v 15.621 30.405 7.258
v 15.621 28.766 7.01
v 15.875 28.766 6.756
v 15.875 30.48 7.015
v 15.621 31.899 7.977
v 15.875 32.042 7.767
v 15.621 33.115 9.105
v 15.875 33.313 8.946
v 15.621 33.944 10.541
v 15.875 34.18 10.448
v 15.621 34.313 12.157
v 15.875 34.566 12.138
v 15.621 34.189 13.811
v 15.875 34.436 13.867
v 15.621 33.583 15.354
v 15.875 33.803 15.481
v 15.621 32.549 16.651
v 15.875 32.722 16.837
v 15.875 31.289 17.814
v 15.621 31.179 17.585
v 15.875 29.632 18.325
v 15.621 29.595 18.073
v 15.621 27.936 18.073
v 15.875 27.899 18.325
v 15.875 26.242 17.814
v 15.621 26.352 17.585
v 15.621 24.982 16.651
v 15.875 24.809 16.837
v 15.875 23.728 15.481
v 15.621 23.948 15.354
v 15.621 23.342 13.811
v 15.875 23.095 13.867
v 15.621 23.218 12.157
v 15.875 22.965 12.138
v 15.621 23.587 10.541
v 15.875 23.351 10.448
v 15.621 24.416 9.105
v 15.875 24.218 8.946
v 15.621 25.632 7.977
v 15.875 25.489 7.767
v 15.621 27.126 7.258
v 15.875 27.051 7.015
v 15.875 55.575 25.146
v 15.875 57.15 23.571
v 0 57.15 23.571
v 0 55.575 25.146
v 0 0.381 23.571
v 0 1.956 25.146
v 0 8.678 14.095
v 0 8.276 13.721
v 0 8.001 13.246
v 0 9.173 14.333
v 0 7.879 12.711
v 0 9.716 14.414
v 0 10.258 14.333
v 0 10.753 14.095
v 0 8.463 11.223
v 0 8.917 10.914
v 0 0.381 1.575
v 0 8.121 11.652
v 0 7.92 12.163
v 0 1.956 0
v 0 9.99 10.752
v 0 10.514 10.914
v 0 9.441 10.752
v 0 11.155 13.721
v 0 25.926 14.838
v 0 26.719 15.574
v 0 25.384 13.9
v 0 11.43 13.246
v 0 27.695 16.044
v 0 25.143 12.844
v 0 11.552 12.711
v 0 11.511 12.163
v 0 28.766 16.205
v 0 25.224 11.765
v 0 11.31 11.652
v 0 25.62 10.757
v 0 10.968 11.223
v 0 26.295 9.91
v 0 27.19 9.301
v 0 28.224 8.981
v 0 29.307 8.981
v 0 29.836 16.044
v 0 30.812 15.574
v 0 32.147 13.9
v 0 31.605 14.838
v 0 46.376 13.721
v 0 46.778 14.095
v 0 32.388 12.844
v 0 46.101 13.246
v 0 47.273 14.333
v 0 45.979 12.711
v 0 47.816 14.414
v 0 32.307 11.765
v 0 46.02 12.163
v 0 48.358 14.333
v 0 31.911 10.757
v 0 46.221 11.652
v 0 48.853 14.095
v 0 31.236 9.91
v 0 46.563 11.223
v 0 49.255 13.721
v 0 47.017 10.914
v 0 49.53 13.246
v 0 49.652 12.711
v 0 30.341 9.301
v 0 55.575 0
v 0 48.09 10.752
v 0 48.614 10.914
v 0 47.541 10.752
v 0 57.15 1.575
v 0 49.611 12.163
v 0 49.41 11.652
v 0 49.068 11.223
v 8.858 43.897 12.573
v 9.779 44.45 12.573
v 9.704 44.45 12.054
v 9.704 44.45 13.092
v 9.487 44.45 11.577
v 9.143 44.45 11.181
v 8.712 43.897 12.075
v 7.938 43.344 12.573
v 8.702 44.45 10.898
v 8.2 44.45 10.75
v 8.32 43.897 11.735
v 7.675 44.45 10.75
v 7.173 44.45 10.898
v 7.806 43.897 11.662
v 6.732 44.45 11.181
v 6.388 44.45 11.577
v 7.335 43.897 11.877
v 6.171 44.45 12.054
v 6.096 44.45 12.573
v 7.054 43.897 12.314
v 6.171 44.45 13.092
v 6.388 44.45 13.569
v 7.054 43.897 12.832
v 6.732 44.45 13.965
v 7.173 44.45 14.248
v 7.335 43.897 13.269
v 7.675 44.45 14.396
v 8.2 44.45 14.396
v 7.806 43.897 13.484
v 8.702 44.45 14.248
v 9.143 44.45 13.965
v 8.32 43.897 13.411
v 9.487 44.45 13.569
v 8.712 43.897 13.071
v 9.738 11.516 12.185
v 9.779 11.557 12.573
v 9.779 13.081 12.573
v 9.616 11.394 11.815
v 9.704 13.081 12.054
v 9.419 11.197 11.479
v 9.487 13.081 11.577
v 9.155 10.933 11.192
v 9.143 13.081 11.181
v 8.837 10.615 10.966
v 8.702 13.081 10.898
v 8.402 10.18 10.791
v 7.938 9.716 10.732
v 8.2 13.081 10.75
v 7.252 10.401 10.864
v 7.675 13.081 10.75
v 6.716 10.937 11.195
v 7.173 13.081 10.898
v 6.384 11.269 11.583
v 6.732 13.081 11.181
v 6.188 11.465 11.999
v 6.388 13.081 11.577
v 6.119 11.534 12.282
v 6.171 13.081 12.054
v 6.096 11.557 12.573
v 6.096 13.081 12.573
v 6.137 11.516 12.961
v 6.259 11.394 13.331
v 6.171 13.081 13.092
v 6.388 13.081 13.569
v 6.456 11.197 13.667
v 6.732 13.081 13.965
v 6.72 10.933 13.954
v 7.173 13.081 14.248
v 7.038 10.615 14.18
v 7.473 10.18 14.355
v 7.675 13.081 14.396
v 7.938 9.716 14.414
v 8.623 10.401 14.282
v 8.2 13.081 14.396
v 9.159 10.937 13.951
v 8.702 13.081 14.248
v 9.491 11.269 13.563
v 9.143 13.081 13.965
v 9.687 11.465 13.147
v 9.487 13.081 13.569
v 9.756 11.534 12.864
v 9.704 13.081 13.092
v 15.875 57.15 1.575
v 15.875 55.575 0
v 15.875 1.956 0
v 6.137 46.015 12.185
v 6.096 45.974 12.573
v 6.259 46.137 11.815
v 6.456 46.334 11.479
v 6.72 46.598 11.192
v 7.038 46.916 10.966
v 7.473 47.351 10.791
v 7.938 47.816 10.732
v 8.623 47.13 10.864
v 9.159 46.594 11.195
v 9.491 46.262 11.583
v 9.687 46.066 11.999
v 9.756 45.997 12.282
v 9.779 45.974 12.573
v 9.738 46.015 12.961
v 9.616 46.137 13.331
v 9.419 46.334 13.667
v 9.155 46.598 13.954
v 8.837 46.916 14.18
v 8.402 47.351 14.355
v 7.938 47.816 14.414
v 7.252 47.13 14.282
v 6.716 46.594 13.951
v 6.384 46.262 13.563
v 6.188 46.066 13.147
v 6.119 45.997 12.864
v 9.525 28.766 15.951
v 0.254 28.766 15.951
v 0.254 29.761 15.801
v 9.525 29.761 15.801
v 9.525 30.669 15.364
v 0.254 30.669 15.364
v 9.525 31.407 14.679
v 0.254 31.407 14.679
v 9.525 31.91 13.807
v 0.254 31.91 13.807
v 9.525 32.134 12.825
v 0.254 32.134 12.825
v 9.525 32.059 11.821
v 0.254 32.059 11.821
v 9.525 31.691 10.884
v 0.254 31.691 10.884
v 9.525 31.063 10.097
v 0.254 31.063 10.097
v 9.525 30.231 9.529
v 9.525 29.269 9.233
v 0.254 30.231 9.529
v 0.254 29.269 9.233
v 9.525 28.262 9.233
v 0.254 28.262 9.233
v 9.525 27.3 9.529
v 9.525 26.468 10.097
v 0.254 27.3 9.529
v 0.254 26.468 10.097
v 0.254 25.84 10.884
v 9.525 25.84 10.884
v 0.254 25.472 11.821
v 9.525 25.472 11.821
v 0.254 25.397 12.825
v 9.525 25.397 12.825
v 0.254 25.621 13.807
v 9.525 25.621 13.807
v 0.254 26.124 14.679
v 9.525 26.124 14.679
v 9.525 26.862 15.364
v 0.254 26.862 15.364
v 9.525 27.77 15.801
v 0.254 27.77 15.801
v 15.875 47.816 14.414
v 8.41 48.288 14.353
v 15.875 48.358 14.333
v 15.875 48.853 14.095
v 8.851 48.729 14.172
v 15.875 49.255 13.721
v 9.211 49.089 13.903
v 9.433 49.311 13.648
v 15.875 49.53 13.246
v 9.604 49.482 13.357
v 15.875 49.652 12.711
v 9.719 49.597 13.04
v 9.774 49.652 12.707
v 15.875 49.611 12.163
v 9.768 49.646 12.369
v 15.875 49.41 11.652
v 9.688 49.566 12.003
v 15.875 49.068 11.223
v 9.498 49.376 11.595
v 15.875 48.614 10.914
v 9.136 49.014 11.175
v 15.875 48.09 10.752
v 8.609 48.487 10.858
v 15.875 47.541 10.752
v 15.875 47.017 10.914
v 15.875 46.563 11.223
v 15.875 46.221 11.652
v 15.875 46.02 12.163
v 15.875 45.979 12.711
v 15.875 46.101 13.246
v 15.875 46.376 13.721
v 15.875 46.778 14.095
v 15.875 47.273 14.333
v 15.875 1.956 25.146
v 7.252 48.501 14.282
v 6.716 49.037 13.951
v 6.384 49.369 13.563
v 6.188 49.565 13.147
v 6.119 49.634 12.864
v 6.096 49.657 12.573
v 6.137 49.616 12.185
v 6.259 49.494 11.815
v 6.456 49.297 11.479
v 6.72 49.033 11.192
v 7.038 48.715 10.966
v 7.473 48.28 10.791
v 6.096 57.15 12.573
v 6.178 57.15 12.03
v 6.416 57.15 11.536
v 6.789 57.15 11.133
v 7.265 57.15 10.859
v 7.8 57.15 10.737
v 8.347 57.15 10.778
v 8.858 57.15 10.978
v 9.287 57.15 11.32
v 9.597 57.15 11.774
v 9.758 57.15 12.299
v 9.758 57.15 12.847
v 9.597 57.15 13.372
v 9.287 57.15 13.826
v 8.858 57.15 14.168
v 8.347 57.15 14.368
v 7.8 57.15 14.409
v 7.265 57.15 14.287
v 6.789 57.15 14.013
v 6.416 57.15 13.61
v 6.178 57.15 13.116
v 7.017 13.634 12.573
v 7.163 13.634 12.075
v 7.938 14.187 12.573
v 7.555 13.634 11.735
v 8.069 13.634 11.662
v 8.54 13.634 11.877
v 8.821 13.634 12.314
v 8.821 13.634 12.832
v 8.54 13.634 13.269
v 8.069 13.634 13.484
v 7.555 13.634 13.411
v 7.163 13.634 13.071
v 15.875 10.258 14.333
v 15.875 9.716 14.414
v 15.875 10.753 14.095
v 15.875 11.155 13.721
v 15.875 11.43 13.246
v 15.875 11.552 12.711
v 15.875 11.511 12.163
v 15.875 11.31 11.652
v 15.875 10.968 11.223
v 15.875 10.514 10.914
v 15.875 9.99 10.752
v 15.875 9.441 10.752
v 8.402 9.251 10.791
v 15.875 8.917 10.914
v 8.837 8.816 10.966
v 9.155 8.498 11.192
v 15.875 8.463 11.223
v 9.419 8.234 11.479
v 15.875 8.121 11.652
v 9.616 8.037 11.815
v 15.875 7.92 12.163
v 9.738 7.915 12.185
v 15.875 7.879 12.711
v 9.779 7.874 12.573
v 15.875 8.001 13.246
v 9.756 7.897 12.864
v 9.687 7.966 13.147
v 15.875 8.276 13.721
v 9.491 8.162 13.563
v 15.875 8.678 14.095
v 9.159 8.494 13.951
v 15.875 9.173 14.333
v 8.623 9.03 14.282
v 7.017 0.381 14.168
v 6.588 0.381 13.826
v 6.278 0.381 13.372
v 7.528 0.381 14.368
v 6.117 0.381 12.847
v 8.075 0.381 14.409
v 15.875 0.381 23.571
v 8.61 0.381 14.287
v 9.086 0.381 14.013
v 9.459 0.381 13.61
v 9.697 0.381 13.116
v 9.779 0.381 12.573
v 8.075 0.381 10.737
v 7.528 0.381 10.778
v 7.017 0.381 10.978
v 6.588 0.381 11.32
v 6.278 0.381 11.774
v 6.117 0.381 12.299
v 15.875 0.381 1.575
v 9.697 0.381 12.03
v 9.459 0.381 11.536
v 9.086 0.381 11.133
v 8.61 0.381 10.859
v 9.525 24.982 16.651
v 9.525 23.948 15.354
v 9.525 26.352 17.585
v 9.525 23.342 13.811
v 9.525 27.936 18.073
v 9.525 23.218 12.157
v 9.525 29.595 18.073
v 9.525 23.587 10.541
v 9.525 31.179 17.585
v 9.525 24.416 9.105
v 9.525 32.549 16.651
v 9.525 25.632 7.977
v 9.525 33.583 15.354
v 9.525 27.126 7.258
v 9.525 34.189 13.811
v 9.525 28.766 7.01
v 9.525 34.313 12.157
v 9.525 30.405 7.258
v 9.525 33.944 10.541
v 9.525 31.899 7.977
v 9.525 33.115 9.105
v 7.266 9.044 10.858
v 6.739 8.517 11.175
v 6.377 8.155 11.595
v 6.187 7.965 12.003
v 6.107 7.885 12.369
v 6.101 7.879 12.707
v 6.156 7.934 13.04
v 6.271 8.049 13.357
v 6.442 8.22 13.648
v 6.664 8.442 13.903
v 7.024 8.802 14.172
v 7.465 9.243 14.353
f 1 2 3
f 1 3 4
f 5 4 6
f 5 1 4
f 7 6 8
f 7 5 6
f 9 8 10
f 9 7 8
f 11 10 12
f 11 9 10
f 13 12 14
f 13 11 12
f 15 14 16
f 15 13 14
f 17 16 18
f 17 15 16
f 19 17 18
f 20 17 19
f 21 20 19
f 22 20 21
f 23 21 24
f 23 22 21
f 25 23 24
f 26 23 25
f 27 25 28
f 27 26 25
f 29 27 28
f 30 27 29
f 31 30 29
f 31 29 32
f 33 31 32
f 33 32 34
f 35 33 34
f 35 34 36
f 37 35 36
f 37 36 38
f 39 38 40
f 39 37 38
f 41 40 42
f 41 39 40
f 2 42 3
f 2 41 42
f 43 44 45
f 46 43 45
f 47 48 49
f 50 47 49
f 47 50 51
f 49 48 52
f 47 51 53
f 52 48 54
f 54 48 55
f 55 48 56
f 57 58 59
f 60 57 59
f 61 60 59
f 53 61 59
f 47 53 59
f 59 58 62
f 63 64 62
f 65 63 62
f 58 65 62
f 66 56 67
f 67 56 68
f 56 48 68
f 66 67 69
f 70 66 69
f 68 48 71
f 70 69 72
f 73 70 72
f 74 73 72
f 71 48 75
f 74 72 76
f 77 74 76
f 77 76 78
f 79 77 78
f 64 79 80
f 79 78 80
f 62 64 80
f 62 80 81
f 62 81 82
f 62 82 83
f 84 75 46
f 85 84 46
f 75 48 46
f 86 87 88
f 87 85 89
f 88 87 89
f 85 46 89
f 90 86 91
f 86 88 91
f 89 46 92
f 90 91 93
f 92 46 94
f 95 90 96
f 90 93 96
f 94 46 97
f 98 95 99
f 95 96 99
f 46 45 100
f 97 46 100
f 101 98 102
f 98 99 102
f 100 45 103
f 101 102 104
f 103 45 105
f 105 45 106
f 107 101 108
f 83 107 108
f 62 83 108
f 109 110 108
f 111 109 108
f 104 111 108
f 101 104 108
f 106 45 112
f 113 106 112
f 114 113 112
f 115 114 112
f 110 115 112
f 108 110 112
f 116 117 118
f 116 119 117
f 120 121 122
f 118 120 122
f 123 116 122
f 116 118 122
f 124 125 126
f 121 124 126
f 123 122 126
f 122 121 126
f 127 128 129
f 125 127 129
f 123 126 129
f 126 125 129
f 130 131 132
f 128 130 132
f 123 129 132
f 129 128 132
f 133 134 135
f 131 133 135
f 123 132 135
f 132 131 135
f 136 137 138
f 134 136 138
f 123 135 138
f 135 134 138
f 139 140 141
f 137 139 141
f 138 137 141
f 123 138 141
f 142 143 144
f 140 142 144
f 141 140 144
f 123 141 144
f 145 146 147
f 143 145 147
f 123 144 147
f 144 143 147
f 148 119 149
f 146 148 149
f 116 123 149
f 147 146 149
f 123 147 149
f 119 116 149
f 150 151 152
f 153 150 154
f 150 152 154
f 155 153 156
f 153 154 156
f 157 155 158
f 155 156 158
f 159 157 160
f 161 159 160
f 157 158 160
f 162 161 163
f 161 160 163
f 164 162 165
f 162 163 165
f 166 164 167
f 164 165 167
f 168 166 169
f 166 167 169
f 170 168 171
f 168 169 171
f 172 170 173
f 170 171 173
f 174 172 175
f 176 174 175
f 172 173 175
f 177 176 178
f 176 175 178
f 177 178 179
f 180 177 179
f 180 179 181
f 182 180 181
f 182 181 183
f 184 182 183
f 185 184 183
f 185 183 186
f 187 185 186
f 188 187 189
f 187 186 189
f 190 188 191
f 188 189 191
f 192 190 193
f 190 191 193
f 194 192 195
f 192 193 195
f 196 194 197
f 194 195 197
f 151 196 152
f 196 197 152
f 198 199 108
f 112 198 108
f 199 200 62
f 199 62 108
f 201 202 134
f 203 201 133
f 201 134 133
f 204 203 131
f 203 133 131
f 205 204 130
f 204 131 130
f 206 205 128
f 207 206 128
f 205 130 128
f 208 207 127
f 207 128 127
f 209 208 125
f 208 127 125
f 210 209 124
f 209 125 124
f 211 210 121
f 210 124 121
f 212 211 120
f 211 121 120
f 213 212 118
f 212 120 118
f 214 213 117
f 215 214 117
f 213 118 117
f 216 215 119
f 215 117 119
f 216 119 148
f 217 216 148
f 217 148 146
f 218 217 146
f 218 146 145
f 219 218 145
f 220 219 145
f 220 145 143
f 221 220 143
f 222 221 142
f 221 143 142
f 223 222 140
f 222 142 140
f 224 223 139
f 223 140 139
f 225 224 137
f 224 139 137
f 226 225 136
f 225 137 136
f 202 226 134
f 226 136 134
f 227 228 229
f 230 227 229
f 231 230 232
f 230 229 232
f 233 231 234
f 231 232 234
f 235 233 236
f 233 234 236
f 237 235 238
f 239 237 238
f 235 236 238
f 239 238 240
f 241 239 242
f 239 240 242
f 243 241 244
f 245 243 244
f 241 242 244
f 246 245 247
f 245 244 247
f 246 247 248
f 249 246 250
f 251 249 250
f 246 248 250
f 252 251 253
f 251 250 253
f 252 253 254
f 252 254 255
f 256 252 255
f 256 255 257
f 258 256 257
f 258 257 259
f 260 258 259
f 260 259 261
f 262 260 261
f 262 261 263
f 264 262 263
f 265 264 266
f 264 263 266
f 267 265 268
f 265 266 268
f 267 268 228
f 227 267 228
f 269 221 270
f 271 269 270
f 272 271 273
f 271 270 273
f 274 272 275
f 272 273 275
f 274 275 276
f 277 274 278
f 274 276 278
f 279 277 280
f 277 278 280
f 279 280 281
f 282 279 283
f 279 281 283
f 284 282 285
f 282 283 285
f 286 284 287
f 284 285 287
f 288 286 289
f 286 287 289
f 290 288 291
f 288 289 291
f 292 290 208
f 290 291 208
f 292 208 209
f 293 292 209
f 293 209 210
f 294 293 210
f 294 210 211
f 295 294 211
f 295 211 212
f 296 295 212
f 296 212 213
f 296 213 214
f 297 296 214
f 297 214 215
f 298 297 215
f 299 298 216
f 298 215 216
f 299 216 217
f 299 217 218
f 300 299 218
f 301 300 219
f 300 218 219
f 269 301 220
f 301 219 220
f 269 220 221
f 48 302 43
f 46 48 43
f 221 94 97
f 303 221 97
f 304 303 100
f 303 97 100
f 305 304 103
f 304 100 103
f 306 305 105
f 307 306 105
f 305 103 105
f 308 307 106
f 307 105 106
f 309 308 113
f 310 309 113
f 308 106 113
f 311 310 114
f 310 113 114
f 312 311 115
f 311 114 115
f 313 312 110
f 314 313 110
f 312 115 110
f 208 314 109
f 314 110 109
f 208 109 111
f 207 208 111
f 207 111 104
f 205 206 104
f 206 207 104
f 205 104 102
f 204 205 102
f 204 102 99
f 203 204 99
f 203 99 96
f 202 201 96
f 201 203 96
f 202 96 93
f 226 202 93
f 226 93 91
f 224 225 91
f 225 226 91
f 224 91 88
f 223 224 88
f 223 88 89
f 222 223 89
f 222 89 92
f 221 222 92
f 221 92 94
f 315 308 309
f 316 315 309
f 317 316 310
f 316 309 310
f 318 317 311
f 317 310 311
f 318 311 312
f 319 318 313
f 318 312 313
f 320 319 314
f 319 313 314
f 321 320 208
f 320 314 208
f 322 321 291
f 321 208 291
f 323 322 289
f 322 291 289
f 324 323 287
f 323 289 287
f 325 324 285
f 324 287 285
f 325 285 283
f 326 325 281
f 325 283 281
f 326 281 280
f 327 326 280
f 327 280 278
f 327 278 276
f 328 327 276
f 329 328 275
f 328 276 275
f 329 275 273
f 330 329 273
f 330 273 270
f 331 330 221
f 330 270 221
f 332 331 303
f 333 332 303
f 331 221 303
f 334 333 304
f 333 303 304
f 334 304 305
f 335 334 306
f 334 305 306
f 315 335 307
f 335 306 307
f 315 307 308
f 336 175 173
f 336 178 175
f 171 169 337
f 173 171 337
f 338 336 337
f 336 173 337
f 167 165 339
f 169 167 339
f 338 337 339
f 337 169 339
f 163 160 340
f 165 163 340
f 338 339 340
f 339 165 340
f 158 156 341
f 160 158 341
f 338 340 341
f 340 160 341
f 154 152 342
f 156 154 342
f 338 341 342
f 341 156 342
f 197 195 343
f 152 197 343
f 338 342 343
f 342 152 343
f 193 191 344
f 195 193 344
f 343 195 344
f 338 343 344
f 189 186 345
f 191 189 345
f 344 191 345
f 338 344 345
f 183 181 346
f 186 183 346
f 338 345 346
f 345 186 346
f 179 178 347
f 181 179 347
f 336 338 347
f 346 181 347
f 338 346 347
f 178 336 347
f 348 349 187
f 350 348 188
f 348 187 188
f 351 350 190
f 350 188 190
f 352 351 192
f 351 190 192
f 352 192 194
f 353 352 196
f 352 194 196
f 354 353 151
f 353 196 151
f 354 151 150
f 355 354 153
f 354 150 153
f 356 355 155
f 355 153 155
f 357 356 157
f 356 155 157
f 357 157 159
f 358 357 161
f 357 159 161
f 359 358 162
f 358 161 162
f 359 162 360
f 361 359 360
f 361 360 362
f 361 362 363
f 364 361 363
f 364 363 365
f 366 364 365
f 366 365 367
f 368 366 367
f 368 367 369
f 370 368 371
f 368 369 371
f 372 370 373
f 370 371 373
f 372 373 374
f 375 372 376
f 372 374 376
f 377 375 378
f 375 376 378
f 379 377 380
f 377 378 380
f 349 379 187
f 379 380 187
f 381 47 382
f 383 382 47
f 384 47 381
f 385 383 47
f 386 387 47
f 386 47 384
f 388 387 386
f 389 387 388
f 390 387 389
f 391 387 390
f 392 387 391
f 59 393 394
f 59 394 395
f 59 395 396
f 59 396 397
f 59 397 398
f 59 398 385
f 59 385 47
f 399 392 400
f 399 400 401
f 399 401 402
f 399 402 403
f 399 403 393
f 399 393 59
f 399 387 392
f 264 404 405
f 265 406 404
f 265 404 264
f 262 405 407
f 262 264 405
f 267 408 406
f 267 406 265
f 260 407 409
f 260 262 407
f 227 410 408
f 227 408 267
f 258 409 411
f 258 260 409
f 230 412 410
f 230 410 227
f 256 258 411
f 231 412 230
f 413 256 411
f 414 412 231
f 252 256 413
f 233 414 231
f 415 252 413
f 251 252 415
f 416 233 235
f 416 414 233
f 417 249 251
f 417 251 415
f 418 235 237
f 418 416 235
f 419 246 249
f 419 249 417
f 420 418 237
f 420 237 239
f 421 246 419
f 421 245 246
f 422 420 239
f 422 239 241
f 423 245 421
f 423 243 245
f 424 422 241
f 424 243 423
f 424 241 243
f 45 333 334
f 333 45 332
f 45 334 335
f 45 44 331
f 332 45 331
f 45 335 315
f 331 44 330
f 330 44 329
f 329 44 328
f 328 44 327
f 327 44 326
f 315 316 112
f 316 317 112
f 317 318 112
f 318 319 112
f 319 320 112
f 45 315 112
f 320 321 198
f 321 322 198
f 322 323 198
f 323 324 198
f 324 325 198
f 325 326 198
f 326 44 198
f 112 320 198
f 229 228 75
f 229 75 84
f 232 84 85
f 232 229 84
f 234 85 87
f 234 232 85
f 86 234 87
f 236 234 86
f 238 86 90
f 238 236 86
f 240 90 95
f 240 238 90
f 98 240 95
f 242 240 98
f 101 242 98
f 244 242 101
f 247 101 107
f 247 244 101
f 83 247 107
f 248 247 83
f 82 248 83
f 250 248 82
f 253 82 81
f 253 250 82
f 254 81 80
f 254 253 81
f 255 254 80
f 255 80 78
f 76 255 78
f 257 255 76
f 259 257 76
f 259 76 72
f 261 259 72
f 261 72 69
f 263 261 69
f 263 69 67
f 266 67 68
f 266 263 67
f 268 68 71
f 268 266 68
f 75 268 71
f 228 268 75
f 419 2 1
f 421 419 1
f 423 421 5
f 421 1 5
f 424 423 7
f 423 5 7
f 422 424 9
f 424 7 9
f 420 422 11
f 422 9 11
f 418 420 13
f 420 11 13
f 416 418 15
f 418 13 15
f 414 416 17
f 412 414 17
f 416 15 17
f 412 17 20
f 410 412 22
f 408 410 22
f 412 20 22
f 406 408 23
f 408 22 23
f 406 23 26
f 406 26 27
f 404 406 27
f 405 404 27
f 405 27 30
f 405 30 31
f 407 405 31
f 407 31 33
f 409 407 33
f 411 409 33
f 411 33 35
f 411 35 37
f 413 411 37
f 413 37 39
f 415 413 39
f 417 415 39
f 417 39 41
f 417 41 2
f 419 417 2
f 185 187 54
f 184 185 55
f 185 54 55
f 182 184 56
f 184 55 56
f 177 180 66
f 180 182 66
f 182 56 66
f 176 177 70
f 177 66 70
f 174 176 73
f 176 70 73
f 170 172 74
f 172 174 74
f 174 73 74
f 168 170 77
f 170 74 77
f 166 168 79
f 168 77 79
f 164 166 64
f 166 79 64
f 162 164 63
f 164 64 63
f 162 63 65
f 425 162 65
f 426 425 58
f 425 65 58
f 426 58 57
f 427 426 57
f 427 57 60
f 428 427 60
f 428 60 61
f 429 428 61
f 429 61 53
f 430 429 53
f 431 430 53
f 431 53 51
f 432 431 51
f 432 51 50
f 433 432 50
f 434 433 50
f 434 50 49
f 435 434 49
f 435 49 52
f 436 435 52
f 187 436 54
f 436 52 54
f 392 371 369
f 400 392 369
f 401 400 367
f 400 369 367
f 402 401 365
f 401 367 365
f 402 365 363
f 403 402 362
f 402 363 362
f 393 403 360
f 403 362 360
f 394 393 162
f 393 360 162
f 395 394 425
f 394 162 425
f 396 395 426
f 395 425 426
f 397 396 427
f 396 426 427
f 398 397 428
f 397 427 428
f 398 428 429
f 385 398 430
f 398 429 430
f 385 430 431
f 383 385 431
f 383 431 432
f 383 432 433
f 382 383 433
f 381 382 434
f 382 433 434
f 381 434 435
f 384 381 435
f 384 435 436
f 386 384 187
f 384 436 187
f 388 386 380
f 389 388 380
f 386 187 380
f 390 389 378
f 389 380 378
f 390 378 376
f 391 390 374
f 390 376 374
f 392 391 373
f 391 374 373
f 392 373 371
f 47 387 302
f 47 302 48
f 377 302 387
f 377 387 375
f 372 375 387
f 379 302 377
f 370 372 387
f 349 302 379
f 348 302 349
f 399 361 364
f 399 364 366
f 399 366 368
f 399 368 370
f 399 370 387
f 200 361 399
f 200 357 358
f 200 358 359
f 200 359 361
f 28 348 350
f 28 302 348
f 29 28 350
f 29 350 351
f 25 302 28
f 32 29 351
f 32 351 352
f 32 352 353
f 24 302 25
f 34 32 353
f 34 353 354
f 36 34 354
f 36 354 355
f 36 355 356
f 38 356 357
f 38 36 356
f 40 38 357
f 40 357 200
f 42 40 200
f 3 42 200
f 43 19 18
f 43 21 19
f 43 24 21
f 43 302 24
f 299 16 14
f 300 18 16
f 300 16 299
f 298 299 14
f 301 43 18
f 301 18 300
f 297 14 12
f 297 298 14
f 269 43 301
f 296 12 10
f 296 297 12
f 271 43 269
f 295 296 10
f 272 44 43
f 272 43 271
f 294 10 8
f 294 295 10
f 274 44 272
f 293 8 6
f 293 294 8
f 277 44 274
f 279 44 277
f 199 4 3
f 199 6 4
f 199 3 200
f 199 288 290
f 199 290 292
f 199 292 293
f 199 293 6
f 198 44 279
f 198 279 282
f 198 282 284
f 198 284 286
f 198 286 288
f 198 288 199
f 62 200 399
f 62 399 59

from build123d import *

# Parameters (mm, degrees)
SKETCH1_W                               = 25.146
SKETCH1_H                               = 56.769
BOSS_EXTRUDE1_DEPTH                     = 15.875
HOLE1_D                                 = 3.683
HOLE1_DEPTH                             = 12.7
HOLE1_TIP                               = 1.10648483
HOLE2_D                                 = 3.683
HOLE2_DEPTH                             = 12.7
HOLE2_TIP                               = 1.10648483
HOLE3_D                                 = 3.683
HOLE3_DEPTH                             = 23.8125
CBORE_FOR_M6_HEX_HEAD_BOLT1_D           = 6.7564
CBORE_FOR_M6_HEX_HEAD_BOLT1_CBORE_D     = 11.1252
CBORE_FOR_M6_HEX_HEAD_BOLT1_CBORE_DEPTH = 6.35
CHAMFER1_SIZE                           = 1.5748
CHAMFER2_SIZE                           = 0.254


with BuildPart() as part:
    # Sketch1 → Boss-Extrude1 (new body)
    with BuildSketch(Plane(origin=(15.875, 0, 0), x_dir=(0, 0, -1), z_dir=(1, 0, 0))):
        with Locations((-12.573, 28.7655)):
            Rectangle(SKETCH1_W, SKETCH1_H)
    extrude(amount=-BOSS_EXTRUDE1_DEPTH)

    # Hole1
    with Locations(Plane(origin=(0, 0.381, 0), x_dir=(-1, 0, 0), z_dir=(0, -1, 0))):
        with Locations((-7.9375, -12.573)):
            Hole(HOLE1_D / 2, depth=HOLE1_DEPTH)
            with Locations((0, 0, -(HOLE1_DEPTH + HOLE1_TIP / 2))):  # 118° drill point
                Cone(0, HOLE1_D / 2, HOLE1_TIP, mode=Mode.SUBTRACT)

    # Hole2
    with Locations(Plane(origin=(0, 57.15, 0), x_dir=(1, 0, 0), z_dir=(0, 1, 0))):
        with Locations((7.9375, -12.573)):
            Hole(HOLE2_D / 2, depth=HOLE2_DEPTH)
            with Locations((0, 0, -(HOLE2_DEPTH + HOLE2_TIP / 2))):  # 118° drill point
                Cone(0, HOLE2_D / 2, HOLE2_TIP, mode=Mode.SUBTRACT)

    # Hole3
    with Locations(Plane(origin=(15.875, 0, 0), x_dir=(0, 0, -1), z_dir=(1, 0, 0))):
        with Locations((-12.573, 47.8155), (-12.573, 9.7155)):
            Hole(HOLE3_D / 2, depth=HOLE3_DEPTH)

    # CBORE for M6 Hex Head Bolt1 (through all)
    with Locations(Plane(origin=(15.875, 0, 0), x_dir=(0, 0, -1), z_dir=(1, 0, 0))):
        with Locations((-12.573, 28.7655)):
            CounterBoreHole(CBORE_FOR_M6_HEX_HEAD_BOLT1_D / 2, CBORE_FOR_M6_HEX_HEAD_BOLT1_CBORE_D / 2, CBORE_FOR_M6_HEX_HEAD_BOLT1_CBORE_DEPTH)

    # Chamfer1
    chamfer1_edges = [part.edges().sort_by_distance(p)[0] for p in [
        (7.9375, 57.15, 0),
        (7.9375, 0.381, 0),
        (7.9375, 0.381, 25.146),
        (7.9375, 57.15, 25.146),
    ]]
    chamfer(chamfer1_edges, length=CHAMFER1_SIZE)

    # Chamfer2
    chamfer2_edges = [part.edges().sort_by_distance(p)[0] for p in [
        (15.875, 28.7655, 18.1356),
        (0, 28.7655, 9.1948),
    ]]
    chamfer(chamfer2_edges, length=CHAMFER2_SIZE)


solid = part.part
